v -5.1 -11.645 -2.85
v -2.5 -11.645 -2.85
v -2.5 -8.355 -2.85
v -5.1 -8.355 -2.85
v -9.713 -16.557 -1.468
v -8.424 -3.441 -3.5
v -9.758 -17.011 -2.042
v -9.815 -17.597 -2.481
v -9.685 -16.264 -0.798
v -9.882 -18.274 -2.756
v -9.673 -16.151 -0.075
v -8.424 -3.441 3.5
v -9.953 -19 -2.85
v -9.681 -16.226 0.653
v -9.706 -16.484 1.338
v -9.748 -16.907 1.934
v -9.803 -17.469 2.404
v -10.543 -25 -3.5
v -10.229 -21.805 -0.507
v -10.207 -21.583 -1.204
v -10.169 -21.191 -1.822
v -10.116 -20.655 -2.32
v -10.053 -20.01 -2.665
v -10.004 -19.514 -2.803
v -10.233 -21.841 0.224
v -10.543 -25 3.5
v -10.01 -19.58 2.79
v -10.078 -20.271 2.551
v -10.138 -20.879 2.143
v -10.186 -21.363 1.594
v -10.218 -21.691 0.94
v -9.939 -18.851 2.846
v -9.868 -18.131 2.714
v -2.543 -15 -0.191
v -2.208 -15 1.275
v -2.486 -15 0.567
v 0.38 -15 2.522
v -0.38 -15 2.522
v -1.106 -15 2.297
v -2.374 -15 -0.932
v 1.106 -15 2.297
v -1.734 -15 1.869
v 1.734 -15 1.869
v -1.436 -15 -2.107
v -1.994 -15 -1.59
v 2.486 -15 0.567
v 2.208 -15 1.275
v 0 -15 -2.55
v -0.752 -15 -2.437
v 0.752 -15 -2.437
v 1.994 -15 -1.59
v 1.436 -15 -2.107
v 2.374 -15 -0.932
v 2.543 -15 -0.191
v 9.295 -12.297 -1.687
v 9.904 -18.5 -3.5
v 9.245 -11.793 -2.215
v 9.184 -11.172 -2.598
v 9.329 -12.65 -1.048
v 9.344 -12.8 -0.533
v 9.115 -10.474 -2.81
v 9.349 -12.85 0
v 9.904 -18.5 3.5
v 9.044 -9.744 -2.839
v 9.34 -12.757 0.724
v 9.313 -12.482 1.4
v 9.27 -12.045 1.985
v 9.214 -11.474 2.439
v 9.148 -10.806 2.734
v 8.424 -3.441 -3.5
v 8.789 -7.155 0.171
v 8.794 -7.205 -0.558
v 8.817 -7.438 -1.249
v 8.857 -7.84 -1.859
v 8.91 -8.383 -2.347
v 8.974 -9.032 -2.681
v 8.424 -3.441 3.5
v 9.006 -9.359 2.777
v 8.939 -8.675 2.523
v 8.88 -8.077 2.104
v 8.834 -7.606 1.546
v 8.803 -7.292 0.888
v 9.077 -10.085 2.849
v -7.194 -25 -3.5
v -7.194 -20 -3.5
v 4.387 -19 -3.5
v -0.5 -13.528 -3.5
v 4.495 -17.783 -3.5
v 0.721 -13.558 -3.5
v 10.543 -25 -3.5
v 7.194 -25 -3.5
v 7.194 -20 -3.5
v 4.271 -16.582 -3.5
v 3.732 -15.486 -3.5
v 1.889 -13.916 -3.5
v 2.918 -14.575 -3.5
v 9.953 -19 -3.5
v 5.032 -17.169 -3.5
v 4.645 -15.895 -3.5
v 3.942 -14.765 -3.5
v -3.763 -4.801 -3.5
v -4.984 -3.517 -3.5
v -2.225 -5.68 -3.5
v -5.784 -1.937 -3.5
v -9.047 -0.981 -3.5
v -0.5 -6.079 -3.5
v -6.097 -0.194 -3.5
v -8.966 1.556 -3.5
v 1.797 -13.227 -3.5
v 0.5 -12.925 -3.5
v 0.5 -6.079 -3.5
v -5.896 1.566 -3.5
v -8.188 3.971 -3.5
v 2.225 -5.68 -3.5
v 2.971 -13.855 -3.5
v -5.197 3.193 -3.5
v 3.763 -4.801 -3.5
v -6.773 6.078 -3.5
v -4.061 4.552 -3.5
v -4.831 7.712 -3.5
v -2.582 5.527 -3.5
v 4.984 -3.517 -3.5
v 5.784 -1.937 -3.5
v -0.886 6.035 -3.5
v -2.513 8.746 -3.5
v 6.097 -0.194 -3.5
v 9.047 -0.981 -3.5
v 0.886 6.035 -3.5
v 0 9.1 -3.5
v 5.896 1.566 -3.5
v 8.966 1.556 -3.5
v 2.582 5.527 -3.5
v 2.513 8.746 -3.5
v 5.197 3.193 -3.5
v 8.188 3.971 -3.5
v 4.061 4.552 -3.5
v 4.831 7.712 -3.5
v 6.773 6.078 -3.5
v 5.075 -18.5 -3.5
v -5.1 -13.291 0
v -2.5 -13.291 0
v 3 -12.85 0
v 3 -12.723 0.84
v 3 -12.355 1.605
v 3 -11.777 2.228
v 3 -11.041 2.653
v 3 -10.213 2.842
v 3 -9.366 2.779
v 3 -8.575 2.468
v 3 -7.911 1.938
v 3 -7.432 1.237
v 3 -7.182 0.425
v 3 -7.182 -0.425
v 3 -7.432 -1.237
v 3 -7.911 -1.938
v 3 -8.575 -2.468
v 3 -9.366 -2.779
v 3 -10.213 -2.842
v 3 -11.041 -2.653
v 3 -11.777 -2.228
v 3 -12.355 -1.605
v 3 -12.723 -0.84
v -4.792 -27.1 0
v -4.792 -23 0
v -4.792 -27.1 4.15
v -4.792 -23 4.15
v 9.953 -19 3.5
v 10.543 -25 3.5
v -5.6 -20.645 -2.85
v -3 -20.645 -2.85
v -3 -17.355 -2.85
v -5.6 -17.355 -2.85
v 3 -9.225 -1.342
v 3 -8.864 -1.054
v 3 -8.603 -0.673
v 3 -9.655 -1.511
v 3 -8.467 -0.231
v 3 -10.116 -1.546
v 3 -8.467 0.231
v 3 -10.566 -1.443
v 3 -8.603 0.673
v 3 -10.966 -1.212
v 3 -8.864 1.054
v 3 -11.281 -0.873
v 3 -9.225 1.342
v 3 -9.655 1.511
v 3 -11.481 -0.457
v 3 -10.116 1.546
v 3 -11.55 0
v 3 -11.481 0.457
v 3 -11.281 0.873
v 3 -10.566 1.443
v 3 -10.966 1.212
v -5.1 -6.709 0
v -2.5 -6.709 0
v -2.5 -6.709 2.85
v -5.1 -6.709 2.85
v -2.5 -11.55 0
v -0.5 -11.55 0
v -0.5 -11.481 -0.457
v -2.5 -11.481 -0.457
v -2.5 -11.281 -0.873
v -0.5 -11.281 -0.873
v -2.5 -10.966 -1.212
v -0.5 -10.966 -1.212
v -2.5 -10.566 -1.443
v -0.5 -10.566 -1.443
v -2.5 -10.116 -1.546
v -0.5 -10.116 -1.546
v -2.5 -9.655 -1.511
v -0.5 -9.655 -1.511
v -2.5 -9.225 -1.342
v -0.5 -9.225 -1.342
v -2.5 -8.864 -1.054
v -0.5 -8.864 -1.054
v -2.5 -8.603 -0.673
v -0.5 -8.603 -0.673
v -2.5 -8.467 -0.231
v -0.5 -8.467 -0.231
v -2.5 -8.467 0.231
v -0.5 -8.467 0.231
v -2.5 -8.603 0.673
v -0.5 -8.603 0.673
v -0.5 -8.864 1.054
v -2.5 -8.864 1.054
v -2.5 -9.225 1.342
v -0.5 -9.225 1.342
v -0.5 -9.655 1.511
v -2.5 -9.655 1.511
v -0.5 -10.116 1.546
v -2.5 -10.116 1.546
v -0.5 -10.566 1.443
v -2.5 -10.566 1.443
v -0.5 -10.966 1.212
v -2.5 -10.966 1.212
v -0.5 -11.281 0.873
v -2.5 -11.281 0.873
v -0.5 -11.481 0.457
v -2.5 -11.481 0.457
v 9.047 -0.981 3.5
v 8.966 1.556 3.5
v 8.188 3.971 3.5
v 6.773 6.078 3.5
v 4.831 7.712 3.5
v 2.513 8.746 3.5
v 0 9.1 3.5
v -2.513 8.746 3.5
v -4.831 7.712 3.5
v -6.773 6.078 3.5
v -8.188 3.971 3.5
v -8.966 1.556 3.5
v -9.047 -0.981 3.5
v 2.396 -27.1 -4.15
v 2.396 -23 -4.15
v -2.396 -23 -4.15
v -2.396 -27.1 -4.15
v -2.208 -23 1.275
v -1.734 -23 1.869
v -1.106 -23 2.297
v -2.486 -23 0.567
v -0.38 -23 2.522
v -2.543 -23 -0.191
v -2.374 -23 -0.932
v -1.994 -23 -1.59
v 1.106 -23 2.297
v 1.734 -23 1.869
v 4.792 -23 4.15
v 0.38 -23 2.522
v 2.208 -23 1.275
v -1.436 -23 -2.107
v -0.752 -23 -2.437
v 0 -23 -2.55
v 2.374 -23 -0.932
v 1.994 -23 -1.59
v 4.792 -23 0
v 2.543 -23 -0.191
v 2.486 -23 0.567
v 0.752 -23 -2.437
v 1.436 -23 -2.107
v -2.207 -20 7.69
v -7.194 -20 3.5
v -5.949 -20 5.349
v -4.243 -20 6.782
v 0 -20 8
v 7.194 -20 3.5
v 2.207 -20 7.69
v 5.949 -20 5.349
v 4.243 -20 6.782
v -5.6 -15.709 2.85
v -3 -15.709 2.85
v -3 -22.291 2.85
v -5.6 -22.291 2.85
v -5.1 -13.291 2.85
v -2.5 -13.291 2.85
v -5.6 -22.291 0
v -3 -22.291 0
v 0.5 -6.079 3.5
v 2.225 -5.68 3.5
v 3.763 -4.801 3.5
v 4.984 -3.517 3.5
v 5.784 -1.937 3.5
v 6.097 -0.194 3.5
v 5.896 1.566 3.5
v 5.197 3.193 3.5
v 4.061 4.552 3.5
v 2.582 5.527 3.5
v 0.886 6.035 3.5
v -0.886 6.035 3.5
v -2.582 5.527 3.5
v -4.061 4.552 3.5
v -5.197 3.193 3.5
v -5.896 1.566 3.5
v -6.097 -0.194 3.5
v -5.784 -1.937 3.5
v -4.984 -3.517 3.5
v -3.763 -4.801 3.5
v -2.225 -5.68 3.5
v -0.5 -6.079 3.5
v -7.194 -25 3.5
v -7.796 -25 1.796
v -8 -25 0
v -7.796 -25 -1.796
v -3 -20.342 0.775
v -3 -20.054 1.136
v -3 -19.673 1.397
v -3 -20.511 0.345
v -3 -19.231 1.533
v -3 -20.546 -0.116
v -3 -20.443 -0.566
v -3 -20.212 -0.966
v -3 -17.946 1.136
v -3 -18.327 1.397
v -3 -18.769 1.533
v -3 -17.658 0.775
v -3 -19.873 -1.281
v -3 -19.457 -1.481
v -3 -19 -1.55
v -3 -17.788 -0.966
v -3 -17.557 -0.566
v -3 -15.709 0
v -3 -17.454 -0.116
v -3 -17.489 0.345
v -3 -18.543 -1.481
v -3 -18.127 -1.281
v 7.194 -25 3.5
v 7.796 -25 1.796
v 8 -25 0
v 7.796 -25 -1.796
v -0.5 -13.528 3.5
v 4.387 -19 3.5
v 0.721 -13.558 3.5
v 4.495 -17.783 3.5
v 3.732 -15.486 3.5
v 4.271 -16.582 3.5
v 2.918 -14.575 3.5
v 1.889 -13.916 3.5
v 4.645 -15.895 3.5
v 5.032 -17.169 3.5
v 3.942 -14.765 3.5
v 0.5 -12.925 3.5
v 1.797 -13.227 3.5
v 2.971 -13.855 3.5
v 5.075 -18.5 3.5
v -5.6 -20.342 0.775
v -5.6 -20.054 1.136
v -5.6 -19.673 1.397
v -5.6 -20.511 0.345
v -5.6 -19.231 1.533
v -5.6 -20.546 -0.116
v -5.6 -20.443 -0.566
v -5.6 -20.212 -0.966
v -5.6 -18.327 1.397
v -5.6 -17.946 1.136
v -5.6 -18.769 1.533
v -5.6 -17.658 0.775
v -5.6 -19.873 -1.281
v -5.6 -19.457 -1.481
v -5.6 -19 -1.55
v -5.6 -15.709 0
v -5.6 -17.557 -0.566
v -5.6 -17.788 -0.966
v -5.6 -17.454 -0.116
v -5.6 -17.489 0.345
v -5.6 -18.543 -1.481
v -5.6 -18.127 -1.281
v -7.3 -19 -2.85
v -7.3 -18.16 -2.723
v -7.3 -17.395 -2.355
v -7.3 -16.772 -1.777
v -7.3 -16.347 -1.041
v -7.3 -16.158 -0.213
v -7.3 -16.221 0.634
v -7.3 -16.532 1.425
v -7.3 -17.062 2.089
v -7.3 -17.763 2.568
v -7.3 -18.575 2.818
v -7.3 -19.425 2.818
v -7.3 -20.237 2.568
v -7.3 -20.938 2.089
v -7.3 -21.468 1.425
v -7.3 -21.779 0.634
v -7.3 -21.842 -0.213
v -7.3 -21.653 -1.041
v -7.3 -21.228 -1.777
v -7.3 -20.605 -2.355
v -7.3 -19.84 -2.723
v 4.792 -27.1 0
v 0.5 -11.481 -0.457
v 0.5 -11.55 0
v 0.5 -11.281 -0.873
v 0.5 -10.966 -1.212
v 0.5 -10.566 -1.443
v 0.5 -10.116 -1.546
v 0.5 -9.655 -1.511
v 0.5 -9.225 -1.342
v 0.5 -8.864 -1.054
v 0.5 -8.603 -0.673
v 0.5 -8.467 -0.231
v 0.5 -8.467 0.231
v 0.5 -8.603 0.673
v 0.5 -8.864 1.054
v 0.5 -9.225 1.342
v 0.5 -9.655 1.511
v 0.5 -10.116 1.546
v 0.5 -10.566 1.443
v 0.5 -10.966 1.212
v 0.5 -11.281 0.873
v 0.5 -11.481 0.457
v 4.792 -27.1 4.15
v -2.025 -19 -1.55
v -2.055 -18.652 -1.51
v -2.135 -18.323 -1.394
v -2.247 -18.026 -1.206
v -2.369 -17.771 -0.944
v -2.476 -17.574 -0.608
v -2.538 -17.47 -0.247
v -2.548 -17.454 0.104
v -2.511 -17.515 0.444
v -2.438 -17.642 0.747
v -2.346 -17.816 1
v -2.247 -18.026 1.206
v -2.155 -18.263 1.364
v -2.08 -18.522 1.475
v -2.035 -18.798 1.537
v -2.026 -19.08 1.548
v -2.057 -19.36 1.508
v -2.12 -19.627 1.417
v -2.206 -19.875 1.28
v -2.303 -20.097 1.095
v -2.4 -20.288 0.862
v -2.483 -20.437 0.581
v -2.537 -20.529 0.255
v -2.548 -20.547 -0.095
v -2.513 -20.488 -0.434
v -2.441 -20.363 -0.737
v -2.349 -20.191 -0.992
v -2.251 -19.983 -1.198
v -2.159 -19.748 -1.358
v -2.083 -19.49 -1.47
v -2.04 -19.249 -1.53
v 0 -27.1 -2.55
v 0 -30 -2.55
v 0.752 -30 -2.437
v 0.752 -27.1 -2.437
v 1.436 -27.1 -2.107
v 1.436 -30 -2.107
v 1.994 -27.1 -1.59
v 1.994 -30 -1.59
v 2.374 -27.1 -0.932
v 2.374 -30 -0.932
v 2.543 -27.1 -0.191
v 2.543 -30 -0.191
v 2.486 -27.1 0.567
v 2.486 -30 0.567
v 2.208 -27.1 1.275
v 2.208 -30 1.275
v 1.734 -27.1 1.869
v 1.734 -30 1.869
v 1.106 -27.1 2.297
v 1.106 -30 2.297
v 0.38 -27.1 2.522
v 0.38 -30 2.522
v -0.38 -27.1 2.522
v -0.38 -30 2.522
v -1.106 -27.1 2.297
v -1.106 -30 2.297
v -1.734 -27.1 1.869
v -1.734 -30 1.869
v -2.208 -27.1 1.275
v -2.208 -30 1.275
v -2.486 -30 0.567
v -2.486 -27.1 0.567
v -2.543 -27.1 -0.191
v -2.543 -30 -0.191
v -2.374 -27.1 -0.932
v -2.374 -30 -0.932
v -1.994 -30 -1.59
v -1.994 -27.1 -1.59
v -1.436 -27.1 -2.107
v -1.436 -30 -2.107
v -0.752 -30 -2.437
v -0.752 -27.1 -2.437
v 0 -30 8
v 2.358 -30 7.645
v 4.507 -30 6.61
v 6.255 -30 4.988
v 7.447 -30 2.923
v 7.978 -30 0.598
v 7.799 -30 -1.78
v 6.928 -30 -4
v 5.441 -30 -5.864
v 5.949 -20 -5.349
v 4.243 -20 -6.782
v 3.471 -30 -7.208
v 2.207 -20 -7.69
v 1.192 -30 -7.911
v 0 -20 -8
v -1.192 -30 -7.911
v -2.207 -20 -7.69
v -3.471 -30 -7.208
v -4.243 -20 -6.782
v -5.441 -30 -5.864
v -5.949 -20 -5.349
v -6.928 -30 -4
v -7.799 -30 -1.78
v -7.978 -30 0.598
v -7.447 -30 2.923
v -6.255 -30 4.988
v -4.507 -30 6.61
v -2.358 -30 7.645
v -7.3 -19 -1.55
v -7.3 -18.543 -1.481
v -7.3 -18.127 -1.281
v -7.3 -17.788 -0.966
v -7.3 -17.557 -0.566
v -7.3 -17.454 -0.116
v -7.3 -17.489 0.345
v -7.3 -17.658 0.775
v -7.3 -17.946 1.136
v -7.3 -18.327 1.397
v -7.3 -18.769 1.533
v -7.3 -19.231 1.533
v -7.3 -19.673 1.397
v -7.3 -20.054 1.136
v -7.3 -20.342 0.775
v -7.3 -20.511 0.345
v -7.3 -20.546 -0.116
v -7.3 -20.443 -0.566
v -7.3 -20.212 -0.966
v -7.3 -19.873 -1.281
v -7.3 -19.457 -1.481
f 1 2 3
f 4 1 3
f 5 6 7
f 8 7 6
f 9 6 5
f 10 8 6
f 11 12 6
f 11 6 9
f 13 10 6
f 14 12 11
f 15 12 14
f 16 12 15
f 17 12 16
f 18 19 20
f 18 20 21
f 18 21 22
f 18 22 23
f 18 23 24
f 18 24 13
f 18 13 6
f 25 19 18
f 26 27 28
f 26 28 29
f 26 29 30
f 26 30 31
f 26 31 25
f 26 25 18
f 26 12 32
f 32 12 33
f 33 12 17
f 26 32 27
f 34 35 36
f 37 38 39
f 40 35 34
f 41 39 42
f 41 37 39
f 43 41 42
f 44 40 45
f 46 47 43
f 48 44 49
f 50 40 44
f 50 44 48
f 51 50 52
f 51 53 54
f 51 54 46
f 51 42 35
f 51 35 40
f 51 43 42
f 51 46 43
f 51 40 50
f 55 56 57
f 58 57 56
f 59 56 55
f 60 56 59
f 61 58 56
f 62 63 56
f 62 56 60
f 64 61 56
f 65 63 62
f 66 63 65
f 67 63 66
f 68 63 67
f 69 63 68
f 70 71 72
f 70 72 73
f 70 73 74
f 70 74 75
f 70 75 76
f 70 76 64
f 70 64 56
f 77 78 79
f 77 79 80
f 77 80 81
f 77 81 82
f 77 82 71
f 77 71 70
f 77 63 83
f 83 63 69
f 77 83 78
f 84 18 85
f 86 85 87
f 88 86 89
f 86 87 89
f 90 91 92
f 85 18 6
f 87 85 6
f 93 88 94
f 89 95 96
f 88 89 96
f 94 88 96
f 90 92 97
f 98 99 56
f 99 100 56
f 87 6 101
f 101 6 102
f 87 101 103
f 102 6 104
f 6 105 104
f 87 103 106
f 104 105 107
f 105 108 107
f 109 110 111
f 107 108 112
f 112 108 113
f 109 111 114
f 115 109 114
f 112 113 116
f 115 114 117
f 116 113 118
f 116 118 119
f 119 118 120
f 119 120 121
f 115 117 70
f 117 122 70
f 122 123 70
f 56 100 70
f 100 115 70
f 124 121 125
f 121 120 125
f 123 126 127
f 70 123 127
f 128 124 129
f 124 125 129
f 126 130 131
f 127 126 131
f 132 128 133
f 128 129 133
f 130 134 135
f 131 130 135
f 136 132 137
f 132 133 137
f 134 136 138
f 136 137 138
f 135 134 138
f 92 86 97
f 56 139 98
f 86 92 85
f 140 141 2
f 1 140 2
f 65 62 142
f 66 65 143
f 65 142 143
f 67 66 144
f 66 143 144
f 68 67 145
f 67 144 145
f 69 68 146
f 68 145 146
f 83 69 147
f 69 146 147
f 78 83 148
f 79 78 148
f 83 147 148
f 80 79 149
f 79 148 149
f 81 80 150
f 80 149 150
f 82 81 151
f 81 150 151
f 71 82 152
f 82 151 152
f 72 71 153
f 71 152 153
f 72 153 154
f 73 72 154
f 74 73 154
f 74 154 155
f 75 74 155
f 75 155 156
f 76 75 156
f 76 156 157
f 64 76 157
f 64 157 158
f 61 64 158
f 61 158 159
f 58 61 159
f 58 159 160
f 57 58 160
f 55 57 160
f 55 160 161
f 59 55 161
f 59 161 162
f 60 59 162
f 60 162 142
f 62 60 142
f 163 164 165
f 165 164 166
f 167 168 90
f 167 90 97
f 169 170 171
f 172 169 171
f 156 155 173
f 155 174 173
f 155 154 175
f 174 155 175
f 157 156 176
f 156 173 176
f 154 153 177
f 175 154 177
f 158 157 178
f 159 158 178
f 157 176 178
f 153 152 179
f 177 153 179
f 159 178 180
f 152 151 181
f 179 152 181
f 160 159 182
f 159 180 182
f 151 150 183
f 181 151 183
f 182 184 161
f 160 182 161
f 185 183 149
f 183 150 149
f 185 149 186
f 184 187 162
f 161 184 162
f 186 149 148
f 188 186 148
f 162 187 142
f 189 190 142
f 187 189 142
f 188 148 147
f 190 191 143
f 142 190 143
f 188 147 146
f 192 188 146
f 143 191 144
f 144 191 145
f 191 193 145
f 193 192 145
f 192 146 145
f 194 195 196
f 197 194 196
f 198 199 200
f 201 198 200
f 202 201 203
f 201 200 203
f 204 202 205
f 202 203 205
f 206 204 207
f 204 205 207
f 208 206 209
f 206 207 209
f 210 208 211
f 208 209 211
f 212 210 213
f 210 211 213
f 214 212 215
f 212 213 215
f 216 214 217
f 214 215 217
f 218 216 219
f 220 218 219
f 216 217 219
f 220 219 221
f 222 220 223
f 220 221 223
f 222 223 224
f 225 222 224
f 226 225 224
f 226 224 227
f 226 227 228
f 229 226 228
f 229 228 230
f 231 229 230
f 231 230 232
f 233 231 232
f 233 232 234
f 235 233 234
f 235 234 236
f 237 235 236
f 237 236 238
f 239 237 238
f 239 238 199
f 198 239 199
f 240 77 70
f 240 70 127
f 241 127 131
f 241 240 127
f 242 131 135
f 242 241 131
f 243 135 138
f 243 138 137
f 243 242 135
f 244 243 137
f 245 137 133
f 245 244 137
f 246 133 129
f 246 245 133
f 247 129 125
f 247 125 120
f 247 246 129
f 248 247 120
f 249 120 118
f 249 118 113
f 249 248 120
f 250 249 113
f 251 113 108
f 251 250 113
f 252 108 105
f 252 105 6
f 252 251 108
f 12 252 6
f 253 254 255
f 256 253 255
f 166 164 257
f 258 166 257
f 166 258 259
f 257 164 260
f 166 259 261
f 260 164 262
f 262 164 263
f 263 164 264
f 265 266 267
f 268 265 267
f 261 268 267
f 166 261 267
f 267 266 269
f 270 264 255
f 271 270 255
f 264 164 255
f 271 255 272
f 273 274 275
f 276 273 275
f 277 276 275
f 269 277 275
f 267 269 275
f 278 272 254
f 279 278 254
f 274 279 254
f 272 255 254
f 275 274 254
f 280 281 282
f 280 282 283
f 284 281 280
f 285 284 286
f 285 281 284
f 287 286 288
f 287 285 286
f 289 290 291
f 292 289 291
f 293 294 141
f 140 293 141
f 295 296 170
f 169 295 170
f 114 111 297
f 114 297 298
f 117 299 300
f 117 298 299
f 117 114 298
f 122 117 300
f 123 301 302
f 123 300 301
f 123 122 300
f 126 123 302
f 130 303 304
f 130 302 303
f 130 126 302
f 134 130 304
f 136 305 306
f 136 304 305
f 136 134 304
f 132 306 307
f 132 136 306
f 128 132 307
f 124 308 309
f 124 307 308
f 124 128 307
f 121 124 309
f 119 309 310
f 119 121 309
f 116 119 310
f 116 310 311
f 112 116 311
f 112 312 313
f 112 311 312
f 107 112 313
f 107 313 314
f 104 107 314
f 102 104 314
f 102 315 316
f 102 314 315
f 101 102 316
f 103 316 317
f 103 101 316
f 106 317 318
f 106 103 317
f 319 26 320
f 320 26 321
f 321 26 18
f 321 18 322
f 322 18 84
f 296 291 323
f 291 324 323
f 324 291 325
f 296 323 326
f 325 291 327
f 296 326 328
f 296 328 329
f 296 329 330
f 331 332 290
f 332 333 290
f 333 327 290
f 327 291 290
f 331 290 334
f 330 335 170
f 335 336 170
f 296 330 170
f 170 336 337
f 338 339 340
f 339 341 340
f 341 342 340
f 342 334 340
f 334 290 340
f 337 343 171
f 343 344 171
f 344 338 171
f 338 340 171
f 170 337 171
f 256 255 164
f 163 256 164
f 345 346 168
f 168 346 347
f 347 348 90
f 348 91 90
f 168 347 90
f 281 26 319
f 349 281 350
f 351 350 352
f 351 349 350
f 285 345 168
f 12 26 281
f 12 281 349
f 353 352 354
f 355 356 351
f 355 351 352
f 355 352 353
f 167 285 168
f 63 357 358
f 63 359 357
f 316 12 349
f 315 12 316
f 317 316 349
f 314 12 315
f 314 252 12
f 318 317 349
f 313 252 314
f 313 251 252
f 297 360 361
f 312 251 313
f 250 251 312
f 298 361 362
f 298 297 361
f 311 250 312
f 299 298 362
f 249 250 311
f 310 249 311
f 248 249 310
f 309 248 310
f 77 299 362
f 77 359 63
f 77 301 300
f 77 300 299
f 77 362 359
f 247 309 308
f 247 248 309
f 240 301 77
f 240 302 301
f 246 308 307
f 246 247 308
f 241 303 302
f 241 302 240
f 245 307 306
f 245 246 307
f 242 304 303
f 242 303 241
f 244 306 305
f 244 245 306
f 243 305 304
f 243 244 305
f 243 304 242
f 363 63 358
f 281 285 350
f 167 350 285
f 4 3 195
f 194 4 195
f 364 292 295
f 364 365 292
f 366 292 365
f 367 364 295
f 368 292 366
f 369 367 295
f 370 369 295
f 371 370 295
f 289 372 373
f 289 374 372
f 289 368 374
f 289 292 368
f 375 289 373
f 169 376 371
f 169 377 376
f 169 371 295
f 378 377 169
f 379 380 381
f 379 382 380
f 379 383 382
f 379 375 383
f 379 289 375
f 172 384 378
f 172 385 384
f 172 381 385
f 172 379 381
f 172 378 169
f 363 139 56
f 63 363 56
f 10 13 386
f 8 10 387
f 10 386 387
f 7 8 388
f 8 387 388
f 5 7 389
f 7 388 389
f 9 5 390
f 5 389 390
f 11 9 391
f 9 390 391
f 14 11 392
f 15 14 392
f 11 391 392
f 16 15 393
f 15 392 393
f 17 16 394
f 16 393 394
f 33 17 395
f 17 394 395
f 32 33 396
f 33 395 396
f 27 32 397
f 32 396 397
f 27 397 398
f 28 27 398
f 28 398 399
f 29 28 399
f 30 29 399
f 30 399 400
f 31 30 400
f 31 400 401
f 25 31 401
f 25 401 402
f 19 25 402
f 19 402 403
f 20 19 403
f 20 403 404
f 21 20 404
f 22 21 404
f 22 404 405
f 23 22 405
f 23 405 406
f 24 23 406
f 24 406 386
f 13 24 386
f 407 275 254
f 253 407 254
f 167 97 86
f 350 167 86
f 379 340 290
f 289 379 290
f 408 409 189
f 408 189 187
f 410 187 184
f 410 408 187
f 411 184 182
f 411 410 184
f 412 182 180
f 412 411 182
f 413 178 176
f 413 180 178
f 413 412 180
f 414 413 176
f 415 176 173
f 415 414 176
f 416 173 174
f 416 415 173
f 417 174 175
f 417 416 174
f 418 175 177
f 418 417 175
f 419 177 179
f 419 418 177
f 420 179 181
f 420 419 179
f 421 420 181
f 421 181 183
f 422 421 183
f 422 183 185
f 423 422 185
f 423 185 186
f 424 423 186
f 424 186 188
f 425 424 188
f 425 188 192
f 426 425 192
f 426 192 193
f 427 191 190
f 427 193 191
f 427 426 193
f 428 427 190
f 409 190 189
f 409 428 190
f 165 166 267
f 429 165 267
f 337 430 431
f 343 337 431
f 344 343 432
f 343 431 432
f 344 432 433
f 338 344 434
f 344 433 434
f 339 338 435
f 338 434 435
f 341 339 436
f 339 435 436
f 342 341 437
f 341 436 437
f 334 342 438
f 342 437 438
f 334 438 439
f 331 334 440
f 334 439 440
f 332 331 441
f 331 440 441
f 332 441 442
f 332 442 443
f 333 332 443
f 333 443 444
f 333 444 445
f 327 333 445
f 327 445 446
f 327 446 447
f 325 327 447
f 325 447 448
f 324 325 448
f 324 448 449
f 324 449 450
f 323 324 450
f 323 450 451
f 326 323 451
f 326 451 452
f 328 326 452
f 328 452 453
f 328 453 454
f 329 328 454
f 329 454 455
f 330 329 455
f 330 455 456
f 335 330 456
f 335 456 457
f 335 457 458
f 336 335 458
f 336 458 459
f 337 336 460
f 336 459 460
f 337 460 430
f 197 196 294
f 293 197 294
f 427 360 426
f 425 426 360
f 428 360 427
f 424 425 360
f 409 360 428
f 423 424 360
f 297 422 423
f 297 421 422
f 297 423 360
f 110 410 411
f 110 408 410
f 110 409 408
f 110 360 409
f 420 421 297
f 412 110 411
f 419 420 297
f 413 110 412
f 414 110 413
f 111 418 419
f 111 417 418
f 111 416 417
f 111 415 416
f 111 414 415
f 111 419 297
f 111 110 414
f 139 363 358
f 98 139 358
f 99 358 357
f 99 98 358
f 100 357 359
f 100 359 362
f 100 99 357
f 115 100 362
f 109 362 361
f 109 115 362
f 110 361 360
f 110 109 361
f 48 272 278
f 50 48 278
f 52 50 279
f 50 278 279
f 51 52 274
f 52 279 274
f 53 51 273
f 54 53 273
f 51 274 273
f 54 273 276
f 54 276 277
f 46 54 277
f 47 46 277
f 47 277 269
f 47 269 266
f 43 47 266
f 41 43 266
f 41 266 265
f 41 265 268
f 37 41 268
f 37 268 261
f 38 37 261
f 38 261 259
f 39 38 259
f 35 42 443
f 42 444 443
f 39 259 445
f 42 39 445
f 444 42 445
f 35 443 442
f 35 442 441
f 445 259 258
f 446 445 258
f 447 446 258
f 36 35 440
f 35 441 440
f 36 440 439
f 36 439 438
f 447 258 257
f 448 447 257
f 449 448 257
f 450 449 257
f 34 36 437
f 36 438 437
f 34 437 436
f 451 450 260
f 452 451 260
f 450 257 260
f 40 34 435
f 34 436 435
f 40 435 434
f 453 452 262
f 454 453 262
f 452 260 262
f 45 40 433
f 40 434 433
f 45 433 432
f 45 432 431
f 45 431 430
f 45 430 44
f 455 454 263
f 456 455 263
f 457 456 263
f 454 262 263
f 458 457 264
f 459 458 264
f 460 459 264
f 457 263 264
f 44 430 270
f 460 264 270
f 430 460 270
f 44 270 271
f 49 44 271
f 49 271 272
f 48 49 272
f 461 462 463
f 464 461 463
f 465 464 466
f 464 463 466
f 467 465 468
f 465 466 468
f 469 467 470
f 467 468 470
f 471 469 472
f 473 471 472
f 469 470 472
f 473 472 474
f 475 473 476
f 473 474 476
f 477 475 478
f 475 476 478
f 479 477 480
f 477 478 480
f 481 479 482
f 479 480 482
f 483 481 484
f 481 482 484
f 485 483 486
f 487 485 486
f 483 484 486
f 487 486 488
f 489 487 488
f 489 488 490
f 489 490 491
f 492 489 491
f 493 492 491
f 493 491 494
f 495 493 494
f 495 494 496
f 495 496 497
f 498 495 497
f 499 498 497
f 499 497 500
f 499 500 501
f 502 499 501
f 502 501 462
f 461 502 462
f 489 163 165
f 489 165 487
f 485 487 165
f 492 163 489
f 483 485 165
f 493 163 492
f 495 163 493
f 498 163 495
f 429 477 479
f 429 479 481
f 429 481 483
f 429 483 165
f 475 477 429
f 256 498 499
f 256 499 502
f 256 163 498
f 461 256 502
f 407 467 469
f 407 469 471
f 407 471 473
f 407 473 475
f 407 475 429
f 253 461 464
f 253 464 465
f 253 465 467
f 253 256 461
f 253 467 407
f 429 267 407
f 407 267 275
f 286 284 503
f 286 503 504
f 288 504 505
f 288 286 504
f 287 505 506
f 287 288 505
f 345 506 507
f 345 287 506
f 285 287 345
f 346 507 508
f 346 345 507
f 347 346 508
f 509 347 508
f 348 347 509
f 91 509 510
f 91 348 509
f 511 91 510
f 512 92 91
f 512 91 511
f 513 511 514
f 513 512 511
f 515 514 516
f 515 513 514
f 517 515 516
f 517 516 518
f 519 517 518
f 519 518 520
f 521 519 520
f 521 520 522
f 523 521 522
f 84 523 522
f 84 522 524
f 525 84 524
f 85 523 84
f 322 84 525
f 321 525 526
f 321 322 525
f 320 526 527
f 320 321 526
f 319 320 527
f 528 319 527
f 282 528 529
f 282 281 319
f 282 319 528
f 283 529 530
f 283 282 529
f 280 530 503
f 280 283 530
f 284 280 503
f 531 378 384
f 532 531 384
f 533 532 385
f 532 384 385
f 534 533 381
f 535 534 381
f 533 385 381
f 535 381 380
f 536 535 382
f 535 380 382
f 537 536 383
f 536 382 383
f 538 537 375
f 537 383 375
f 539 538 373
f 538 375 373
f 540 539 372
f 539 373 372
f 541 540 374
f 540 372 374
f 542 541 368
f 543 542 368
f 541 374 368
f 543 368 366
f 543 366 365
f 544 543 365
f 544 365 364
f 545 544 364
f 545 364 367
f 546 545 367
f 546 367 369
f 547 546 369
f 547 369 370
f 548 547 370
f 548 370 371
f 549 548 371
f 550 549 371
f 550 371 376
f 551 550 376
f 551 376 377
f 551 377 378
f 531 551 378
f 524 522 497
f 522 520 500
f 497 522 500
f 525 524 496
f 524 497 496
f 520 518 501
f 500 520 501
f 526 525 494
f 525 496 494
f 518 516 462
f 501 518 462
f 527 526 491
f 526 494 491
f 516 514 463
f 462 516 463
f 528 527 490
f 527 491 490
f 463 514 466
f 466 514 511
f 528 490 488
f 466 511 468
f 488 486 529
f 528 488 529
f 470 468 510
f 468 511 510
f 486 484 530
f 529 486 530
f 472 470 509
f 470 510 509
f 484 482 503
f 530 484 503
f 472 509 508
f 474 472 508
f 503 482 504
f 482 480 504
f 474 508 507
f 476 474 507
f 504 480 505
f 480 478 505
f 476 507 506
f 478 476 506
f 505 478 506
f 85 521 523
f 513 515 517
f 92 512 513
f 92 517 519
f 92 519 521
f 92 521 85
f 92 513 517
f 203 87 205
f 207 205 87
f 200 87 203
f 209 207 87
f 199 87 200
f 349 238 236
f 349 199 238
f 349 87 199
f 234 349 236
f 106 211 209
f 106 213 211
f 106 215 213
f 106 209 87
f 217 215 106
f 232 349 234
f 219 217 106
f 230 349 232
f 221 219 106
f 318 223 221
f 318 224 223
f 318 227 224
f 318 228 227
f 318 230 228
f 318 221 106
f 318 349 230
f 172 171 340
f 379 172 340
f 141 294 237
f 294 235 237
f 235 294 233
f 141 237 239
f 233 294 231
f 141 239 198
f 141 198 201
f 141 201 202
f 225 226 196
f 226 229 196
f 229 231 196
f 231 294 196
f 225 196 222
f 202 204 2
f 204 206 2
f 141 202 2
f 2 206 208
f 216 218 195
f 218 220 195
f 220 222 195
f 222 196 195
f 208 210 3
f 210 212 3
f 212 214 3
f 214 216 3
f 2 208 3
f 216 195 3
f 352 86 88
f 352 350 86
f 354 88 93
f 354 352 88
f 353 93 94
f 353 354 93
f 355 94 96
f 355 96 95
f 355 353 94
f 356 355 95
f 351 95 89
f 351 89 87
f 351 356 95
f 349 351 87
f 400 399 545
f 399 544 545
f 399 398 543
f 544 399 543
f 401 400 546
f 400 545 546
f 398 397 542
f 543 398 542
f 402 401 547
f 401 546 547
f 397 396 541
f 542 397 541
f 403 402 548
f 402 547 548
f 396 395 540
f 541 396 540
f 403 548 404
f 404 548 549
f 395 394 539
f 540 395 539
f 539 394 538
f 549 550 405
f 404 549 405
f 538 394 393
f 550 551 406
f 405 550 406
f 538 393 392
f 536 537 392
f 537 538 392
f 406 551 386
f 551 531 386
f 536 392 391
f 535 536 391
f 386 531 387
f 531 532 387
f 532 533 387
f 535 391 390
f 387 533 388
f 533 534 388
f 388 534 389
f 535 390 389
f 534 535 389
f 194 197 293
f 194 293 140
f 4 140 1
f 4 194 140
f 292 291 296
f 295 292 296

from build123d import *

# Parameters (mm, degrees)
SKETCH1_R                      = 6.1
THICKNESS_DEPTH                = 3.5
BOTNUTCUT_START                = -2
SKETCH2_R                      = 2.85
BOTNUTCUT_DEPTH                = 2.6
SKETCH3_R                      = 1.55
BOTSCREWCUT_DEPTH              = 2
CUT_EXTRUDE1_START             = -7
CUT_EXTRUDE1_DEPTH             = 7
RAILNUTCUT_START               = -2
RAILNUTCUT_DEPTH               = 2.6
SKETCH7_R                      = 1.55
RAILSCREWCUT_DEPTH             = 2.6
RAILSCREWCUT_DIRECTION_2_REACH = 53.909
RAILNUTHEADCUT_REACH           = 56.409
RAILNUTHEADCUT_START           = -2.5
SKETCH8_R                      = 2.85
SKETCH9_W                      = 7
SKETCH9_H                      = 0.5
MOVEMENTCUT_DEPTH              = 7
SKETCH10_R                     = 4.5
BOSS_EXTRUDE1_DEPTH            = 3.5
CUT_EXTRUDE2_START             = -25
SKETCH11_W                     = 40
SKETCH11_H                     = 25
CUT_EXTRUDE2_DEPTH             = 25
SKETCH12_R                     = 8
BOSS_EXTRUDE2_DEPTH            = 10
CUT_EXTRUDE3_START             = -3
CUT_EXTRUDE3_DEPTH             = 4.1
SKETCH14_R                     = 2.55
CUT_EXTRUDE4_DEPTH             = 15
CUT_EXTRUDE5_REACH             = 34.79
SKETCH15_R                     = 1.55
CUT_EXTRUDE6_REACH             = 42.09
CUT_EXTRUDE6_START             = -7.3
SKETCH16_R                     = 2.85
CUT_EXTRUDE7_START             = -3
CUT_EXTRUDE7_DEPTH             = 2.6


with BuildPart() as part:
    # Sketch1 → Thickness (new, symmetric)
    with BuildSketch(Plane.XY):
        with BuildLine():
            Line((-13, -50), (13, -50))
            Line((13, -50), (8.424323952, -3.441041405))
            ThreePointArc((8.424323952, -3.441041405), (0, 9.1), (-8.424323952, -3.441041405))
            Line((-8.424323952, -3.441041405), (-13, -50))
        make_face()
        Circle(SKETCH1_R, mode=Mode.SUBTRACT)
    extrude(amount=THICKNESS_DEPTH, both=True)

    # Sketch2 → BotNutCut (cut)
    with BuildSketch(Plane.XZ.offset(50).offset(BOTNUTCUT_START)):
        with Locations((-7.5, 0)):
            Circle(SKETCH2_R)
        with BuildLine():
            Line((-10.790896534, 2.85), (-10.790896534, 0))
            Line((-10.790896534, 0), (-9.968172361, -1.42500007))
            ThreePointArc((-9.968172361, -1.42500007), (-9.96817242, 1.424999968), (-7.499999995, 2.85))
            Line((-7.499999995, 2.85), (-10.790896534, 2.85))
        make_face()
        with BuildLine():
            Line((-4.209103466, 2.85), (-7.499999995, 2.85))
            ThreePointArc((-7.499999995, 2.85), (-5.484745672, 2.015254324), (-4.65, 0))
            ThreePointArc((-4.65, 0), (-4.747111384, -0.737634237), (-5.031827556, -1.424999925))
            Line((-5.031827556, -1.424999925), (-4.209103466, 0))
            Line((-4.209103466, 0), (-4.209103466, 2.85))
        make_face()
        with BuildLine():
            ThreePointArc((-5.031827556, -1.424999925), (-6.074999963, -2.468172379), (-7.5, -2.85))
            Line((-7.5, -2.85), (-5.854551733, -2.85))
            Line((-5.854551733, -2.85), (-5.031827556, -1.424999925))
        make_face()
        with BuildLine():
            ThreePointArc((-7.5, -2.85), (-8.924999965, -2.468172421), (-9.968172361, -1.42500007))
            Line((-9.968172361, -1.42500007), (-9.145448267, -2.85))
            Line((-9.145448267, -2.85), (-7.5, -2.85))
        make_face()
        with BuildLine():
            ThreePointArc((7.5, -2.85), (6.074999995, -2.468172398), (5.031827593, -1.42499999))
            Line((5.031827593, -1.42499999), (5.854551733, -2.85))
            Line((5.854551733, -2.85), (7.5, -2.85))
        make_face()
        with BuildLine():
            ThreePointArc((9.968172375, -1.425000045), (8.924999978, -2.468172414), (7.5, -2.85))
            Line((7.5, -2.85), (9.145448267, -2.85))
            Line((9.145448267, -2.85), (9.968172375, -1.425000045))
        make_face()
        with BuildLine():
            Line((10.790896534, 2.85), (7.5, 2.85))
            ThreePointArc((7.5, 2.85), (9.515254326, 2.015254326), (10.35, 0))
            ThreePointArc((10.35, 0), (10.252888598, -0.737634304), (9.968172375, -1.425000045))
            Line((9.968172375, -1.425000045), (10.790896534, 0))
            Line((10.790896534, 0), (10.790896534, 2.85))
        make_face()
        with BuildLine():
            Line((4.209103466, 2.85), (4.209103466, 0))
            Line((4.209103466, 0), (5.031827593, -1.42499999))
            ThreePointArc((5.031827593, -1.42499999), (5.031827602, 1.425000005), (7.5, 2.85))
            Line((7.5, 2.85), (4.209103466, 2.85))
        make_face()
        with Locations((7.5, 0)):
            Circle(SKETCH2_R)
    extrude(amount=-BOTNUTCUT_DEPTH, mode=Mode.SUBTRACT)

    # Sketch3 → BotScrewCut (cut)
    with BuildSketch(Plane.XZ.offset(50)):
        with Locations(Location((-7.5, 0, 0), (0, 0, 270))):
            Circle(SKETCH3_R)
        with Locations(Location((7.5, 0, 0), (0, 0, 270))):
            Circle(SKETCH3_R)
    extrude(amount=-BOTSCREWCUT_DEPTH, mode=Mode.SUBTRACT)

    # Sketch5 → Cut-Extrude1 (cut)
    with BuildSketch(Plane.XY.offset(3.5).offset(CUT_EXTRUDE1_START)):
        with BuildLine():
            ThreePointArc((0.5, -6.079473661), (0, -6.1), (-0.5, -6.079473661))
            Line((-0.5, -6.079473661), (-0.5, -12.924568984))
            ThreePointArc((-0.5, -12.924568984), (0, -23.1), (0.5, -12.924568984))
            Line((0.5, -12.924568984), (0.5, -6.079473661))
        make_face()
    extrude(amount=CUT_EXTRUDE1_DEPTH, mode=Mode.SUBTRACT)

    # Sketch6 → RailNutCut (cut)
    with BuildSketch(Plane(origin=(-0.5, 0, 0), x_dir=(0, 0, -1), z_dir=(1, 0, 0)).offset(RAILNUTCUT_START)):
        Polygon((0, -13.290896534), (2.85, -11.645448267), (2.85, -8.354551733), (0, -6.709103466), (-2.85, -6.709103466), (-2.85, -13.290896534), align=None)
    extrude(amount=-RAILNUTCUT_DEPTH, mode=Mode.SUBTRACT)

    # Sketch7 → RailScrewCut (cut)
    with BuildSketch(Plane(origin=(-0.5, 0, 0), x_dir=(0, 0, -1), z_dir=(1, 0, 0))):
        with Locations(Location((0, -10, 0), (0, 0, 270))):
            Circle(SKETCH7_R)
    extrude(amount=-RAILSCREWCUT_DEPTH, mode=Mode.SUBTRACT)

    # RailScrewCut direction 2: up to this plane
    railscrewcut_direction_2_end = Plane(origin=(13, -50, 3.5), z_dir=(-0.9952055153223801, -0.09780583966162733, 0))
    # Sketch7 → RailScrewCut direction 2 (cut, up to the surface)
    with BuildSketch(Plane(origin=(-0.5, 0, 0), x_dir=(0, 0, -1), z_dir=(1, 0, 0)), mode=Mode.PRIVATE) as railscrewcut_direction_2_sk1:
        with Locations(Location((0, -10, 0), (0, 0, 270))):
            Circle(SKETCH7_R)
    railscrewcut_direction_2_tool1 = split(extrude(railscrewcut_direction_2_sk1.sketch, amount=RAILSCREWCUT_DIRECTION_2_REACH, mode=Mode.PRIVATE), bisect_by=railscrewcut_direction_2_end, keep=Keep.BOTH, mode=Mode.PRIVATE)
    add(railscrewcut_direction_2_tool1.solids().sort_by_distance((-0.5, -10, 0))[0], mode=Mode.SUBTRACT)

    # RailNutHeadCut: up to this plane
    railnutheadcut_end = Plane(origin=(13, -50, 3.5), z_dir=(-0.9952055153223801, -0.09780583966162733, 0))
    # Sketch8 → RailNutHeadCut (cut, up to the surface)
    with BuildSketch(Plane.ZY.offset(-0.5).offset(RAILNUTHEADCUT_START), mode=Mode.PRIVATE) as railnutheadcut_sk1:
        with Locations(Location((0, -10, 0), (0, 0, 270))):
            Circle(SKETCH8_R)
    railnutheadcut_tool1 = split(extrude(railnutheadcut_sk1.sketch, amount=-RAILNUTHEADCUT_REACH, mode=Mode.PRIVATE), bisect_by=railnutheadcut_end, keep=Keep.BOTH, mode=Mode.PRIVATE)
    add(railnutheadcut_tool1.solids().sort_by_distance((3, -10, 0))[0], mode=Mode.SUBTRACT)

    # Sketch9 → MovementCut (cut)
    with BuildSketch(Plane.XY.offset(3.5)):
        with Locations((7.5, -18.75)):
            Rectangle(SKETCH9_W, SKETCH9_H)
    extrude(amount=-MOVEMENTCUT_DEPTH, mode=Mode.SUBTRACT)

    # Sketch10 → Boss-Extrude1 (add, symmetric)
    with BuildSketch(Plane.XY):
        with BuildLine():
            Line((-0.5, -13.527864045), (-0.5, -12.924568984))
            ThreePointArc((-0.5, -12.924568984), (-3.780537731, -21.42308844), (5.0009999, -19))
            Line((5.0009999, -19), (4.387482194, -19))
            ThreePointArc((4.387482194, -19), (-3.356217727, -20.997632828), (-0.5, -13.527864045))
        make_face()
        with Locations((0, -18)):
            Circle(SKETCH10_R)
    extrude(amount=BOSS_EXTRUDE1_DEPTH, both=True)

    # Sketch11 → Cut-Extrude2 (cut)
    with BuildSketch(Plane(origin=(0, 0, 0), x_dir=(1, 0, 0), z_dir=(0, 1, 0)).offset(CUT_EXTRUDE2_START)):
        Rectangle(SKETCH11_W, SKETCH11_H)
    extrude(amount=-CUT_EXTRUDE2_DEPTH, mode=Mode.SUBTRACT)

    # Sketch12 → Boss-Extrude2 (add)
    with BuildSketch(Plane(origin=(0, -20, 0), x_dir=(1, 0, 0), z_dir=(0, 1, 0))):
        with Locations(Location((0, 0, 0), (0, 0, 270))):
            Circle(SKETCH12_R)
    extrude(amount=-BOSS_EXTRUDE2_DEPTH)

    # Sketch13 → Cut-Extrude3 (cut)
    with BuildSketch(Plane(origin=(0, -20, 0), x_dir=(1, 0, 0), z_dir=(0, 1, 0)).offset(CUT_EXTRUDE3_START)):
        Polygon((-4.792007234, 0), (-4.792007234, -4.15), (4.792007234, -4.15), (4.792007234, 0), (2.396003617, 4.15), (-2.396003617, 4.15), align=None)
    extrude(amount=-CUT_EXTRUDE3_DEPTH, mode=Mode.SUBTRACT)

    # Sketch14 → Cut-Extrude4 (cut)
    with BuildSketch(Plane.XZ.offset(30)):
        with Locations(Location((0, 0, 0), (0, 0, 270))):
            Circle(SKETCH14_R)
    extrude(amount=-CUT_EXTRUDE4_DEPTH, mode=Mode.SUBTRACT)

    # Cut-Extrude5: up to this plane
    cut_extrude5_end = Plane(origin=(-13, -50, 3.5), z_dir=(0.9952055153223801, -0.09780583966162733, 0))
    # Sketch15 → Cut-Extrude5 (cut, up to the surface)
    with BuildSketch(Plane(origin=(0, 0, 0), x_dir=(0, 0, -1), z_dir=(1, 0, 0)), mode=Mode.PRIVATE) as cut_extrude5_sk1:
        with Locations((0, -19)):
            Circle(SKETCH15_R)
    cut_extrude5_tool1 = split(extrude(cut_extrude5_sk1.sketch, amount=-CUT_EXTRUDE5_REACH, mode=Mode.PRIVATE), bisect_by=cut_extrude5_end, keep=Keep.BOTH, mode=Mode.PRIVATE)
    add(cut_extrude5_tool1.solids().sort_by_distance((0, -19, 0))[0], mode=Mode.SUBTRACT)

    # Cut-Extrude6: up to this plane
    cut_extrude6_end = Plane(origin=(-13, -50, 3.5), z_dir=(0.9952055153223801, -0.09780583966162733, 0))
    # Sketch16 → Cut-Extrude6 (cut, up to the surface)
    with BuildSketch(Plane(origin=(0, 0, 0), x_dir=(0, 0, -1), z_dir=(1, 0, 0)).offset(CUT_EXTRUDE6_START), mode=Mode.PRIVATE) as cut_extrude6_sk1:
        with Locations((0, -19)):
            Circle(SKETCH16_R)
    cut_extrude6_tool1 = split(extrude(cut_extrude6_sk1.sketch, amount=-CUT_EXTRUDE6_REACH, mode=Mode.PRIVATE), bisect_by=cut_extrude6_end, keep=Keep.BOTH, mode=Mode.PRIVATE)
    add(cut_extrude6_tool1.solids().sort_by_distance((-7.3, -19, 0))[0], mode=Mode.SUBTRACT)

    # Sketch17 → Cut-Extrude7 (cut)
    with BuildSketch(Plane(origin=(0, 0, 0), x_dir=(0, 0, -1), z_dir=(1, 0, 0)).offset(CUT_EXTRUDE7_START)):
        Polygon((-2.85, -15.709103466), (-2.85, -22.290896534), (0, -22.290896534), (2.85, -20.645448267), (2.85, -17.354551733), (0, -15.709103466), align=None)
    extrude(amount=-CUT_EXTRUDE7_DEPTH, mode=Mode.SUBTRACT)


solid = part.part
